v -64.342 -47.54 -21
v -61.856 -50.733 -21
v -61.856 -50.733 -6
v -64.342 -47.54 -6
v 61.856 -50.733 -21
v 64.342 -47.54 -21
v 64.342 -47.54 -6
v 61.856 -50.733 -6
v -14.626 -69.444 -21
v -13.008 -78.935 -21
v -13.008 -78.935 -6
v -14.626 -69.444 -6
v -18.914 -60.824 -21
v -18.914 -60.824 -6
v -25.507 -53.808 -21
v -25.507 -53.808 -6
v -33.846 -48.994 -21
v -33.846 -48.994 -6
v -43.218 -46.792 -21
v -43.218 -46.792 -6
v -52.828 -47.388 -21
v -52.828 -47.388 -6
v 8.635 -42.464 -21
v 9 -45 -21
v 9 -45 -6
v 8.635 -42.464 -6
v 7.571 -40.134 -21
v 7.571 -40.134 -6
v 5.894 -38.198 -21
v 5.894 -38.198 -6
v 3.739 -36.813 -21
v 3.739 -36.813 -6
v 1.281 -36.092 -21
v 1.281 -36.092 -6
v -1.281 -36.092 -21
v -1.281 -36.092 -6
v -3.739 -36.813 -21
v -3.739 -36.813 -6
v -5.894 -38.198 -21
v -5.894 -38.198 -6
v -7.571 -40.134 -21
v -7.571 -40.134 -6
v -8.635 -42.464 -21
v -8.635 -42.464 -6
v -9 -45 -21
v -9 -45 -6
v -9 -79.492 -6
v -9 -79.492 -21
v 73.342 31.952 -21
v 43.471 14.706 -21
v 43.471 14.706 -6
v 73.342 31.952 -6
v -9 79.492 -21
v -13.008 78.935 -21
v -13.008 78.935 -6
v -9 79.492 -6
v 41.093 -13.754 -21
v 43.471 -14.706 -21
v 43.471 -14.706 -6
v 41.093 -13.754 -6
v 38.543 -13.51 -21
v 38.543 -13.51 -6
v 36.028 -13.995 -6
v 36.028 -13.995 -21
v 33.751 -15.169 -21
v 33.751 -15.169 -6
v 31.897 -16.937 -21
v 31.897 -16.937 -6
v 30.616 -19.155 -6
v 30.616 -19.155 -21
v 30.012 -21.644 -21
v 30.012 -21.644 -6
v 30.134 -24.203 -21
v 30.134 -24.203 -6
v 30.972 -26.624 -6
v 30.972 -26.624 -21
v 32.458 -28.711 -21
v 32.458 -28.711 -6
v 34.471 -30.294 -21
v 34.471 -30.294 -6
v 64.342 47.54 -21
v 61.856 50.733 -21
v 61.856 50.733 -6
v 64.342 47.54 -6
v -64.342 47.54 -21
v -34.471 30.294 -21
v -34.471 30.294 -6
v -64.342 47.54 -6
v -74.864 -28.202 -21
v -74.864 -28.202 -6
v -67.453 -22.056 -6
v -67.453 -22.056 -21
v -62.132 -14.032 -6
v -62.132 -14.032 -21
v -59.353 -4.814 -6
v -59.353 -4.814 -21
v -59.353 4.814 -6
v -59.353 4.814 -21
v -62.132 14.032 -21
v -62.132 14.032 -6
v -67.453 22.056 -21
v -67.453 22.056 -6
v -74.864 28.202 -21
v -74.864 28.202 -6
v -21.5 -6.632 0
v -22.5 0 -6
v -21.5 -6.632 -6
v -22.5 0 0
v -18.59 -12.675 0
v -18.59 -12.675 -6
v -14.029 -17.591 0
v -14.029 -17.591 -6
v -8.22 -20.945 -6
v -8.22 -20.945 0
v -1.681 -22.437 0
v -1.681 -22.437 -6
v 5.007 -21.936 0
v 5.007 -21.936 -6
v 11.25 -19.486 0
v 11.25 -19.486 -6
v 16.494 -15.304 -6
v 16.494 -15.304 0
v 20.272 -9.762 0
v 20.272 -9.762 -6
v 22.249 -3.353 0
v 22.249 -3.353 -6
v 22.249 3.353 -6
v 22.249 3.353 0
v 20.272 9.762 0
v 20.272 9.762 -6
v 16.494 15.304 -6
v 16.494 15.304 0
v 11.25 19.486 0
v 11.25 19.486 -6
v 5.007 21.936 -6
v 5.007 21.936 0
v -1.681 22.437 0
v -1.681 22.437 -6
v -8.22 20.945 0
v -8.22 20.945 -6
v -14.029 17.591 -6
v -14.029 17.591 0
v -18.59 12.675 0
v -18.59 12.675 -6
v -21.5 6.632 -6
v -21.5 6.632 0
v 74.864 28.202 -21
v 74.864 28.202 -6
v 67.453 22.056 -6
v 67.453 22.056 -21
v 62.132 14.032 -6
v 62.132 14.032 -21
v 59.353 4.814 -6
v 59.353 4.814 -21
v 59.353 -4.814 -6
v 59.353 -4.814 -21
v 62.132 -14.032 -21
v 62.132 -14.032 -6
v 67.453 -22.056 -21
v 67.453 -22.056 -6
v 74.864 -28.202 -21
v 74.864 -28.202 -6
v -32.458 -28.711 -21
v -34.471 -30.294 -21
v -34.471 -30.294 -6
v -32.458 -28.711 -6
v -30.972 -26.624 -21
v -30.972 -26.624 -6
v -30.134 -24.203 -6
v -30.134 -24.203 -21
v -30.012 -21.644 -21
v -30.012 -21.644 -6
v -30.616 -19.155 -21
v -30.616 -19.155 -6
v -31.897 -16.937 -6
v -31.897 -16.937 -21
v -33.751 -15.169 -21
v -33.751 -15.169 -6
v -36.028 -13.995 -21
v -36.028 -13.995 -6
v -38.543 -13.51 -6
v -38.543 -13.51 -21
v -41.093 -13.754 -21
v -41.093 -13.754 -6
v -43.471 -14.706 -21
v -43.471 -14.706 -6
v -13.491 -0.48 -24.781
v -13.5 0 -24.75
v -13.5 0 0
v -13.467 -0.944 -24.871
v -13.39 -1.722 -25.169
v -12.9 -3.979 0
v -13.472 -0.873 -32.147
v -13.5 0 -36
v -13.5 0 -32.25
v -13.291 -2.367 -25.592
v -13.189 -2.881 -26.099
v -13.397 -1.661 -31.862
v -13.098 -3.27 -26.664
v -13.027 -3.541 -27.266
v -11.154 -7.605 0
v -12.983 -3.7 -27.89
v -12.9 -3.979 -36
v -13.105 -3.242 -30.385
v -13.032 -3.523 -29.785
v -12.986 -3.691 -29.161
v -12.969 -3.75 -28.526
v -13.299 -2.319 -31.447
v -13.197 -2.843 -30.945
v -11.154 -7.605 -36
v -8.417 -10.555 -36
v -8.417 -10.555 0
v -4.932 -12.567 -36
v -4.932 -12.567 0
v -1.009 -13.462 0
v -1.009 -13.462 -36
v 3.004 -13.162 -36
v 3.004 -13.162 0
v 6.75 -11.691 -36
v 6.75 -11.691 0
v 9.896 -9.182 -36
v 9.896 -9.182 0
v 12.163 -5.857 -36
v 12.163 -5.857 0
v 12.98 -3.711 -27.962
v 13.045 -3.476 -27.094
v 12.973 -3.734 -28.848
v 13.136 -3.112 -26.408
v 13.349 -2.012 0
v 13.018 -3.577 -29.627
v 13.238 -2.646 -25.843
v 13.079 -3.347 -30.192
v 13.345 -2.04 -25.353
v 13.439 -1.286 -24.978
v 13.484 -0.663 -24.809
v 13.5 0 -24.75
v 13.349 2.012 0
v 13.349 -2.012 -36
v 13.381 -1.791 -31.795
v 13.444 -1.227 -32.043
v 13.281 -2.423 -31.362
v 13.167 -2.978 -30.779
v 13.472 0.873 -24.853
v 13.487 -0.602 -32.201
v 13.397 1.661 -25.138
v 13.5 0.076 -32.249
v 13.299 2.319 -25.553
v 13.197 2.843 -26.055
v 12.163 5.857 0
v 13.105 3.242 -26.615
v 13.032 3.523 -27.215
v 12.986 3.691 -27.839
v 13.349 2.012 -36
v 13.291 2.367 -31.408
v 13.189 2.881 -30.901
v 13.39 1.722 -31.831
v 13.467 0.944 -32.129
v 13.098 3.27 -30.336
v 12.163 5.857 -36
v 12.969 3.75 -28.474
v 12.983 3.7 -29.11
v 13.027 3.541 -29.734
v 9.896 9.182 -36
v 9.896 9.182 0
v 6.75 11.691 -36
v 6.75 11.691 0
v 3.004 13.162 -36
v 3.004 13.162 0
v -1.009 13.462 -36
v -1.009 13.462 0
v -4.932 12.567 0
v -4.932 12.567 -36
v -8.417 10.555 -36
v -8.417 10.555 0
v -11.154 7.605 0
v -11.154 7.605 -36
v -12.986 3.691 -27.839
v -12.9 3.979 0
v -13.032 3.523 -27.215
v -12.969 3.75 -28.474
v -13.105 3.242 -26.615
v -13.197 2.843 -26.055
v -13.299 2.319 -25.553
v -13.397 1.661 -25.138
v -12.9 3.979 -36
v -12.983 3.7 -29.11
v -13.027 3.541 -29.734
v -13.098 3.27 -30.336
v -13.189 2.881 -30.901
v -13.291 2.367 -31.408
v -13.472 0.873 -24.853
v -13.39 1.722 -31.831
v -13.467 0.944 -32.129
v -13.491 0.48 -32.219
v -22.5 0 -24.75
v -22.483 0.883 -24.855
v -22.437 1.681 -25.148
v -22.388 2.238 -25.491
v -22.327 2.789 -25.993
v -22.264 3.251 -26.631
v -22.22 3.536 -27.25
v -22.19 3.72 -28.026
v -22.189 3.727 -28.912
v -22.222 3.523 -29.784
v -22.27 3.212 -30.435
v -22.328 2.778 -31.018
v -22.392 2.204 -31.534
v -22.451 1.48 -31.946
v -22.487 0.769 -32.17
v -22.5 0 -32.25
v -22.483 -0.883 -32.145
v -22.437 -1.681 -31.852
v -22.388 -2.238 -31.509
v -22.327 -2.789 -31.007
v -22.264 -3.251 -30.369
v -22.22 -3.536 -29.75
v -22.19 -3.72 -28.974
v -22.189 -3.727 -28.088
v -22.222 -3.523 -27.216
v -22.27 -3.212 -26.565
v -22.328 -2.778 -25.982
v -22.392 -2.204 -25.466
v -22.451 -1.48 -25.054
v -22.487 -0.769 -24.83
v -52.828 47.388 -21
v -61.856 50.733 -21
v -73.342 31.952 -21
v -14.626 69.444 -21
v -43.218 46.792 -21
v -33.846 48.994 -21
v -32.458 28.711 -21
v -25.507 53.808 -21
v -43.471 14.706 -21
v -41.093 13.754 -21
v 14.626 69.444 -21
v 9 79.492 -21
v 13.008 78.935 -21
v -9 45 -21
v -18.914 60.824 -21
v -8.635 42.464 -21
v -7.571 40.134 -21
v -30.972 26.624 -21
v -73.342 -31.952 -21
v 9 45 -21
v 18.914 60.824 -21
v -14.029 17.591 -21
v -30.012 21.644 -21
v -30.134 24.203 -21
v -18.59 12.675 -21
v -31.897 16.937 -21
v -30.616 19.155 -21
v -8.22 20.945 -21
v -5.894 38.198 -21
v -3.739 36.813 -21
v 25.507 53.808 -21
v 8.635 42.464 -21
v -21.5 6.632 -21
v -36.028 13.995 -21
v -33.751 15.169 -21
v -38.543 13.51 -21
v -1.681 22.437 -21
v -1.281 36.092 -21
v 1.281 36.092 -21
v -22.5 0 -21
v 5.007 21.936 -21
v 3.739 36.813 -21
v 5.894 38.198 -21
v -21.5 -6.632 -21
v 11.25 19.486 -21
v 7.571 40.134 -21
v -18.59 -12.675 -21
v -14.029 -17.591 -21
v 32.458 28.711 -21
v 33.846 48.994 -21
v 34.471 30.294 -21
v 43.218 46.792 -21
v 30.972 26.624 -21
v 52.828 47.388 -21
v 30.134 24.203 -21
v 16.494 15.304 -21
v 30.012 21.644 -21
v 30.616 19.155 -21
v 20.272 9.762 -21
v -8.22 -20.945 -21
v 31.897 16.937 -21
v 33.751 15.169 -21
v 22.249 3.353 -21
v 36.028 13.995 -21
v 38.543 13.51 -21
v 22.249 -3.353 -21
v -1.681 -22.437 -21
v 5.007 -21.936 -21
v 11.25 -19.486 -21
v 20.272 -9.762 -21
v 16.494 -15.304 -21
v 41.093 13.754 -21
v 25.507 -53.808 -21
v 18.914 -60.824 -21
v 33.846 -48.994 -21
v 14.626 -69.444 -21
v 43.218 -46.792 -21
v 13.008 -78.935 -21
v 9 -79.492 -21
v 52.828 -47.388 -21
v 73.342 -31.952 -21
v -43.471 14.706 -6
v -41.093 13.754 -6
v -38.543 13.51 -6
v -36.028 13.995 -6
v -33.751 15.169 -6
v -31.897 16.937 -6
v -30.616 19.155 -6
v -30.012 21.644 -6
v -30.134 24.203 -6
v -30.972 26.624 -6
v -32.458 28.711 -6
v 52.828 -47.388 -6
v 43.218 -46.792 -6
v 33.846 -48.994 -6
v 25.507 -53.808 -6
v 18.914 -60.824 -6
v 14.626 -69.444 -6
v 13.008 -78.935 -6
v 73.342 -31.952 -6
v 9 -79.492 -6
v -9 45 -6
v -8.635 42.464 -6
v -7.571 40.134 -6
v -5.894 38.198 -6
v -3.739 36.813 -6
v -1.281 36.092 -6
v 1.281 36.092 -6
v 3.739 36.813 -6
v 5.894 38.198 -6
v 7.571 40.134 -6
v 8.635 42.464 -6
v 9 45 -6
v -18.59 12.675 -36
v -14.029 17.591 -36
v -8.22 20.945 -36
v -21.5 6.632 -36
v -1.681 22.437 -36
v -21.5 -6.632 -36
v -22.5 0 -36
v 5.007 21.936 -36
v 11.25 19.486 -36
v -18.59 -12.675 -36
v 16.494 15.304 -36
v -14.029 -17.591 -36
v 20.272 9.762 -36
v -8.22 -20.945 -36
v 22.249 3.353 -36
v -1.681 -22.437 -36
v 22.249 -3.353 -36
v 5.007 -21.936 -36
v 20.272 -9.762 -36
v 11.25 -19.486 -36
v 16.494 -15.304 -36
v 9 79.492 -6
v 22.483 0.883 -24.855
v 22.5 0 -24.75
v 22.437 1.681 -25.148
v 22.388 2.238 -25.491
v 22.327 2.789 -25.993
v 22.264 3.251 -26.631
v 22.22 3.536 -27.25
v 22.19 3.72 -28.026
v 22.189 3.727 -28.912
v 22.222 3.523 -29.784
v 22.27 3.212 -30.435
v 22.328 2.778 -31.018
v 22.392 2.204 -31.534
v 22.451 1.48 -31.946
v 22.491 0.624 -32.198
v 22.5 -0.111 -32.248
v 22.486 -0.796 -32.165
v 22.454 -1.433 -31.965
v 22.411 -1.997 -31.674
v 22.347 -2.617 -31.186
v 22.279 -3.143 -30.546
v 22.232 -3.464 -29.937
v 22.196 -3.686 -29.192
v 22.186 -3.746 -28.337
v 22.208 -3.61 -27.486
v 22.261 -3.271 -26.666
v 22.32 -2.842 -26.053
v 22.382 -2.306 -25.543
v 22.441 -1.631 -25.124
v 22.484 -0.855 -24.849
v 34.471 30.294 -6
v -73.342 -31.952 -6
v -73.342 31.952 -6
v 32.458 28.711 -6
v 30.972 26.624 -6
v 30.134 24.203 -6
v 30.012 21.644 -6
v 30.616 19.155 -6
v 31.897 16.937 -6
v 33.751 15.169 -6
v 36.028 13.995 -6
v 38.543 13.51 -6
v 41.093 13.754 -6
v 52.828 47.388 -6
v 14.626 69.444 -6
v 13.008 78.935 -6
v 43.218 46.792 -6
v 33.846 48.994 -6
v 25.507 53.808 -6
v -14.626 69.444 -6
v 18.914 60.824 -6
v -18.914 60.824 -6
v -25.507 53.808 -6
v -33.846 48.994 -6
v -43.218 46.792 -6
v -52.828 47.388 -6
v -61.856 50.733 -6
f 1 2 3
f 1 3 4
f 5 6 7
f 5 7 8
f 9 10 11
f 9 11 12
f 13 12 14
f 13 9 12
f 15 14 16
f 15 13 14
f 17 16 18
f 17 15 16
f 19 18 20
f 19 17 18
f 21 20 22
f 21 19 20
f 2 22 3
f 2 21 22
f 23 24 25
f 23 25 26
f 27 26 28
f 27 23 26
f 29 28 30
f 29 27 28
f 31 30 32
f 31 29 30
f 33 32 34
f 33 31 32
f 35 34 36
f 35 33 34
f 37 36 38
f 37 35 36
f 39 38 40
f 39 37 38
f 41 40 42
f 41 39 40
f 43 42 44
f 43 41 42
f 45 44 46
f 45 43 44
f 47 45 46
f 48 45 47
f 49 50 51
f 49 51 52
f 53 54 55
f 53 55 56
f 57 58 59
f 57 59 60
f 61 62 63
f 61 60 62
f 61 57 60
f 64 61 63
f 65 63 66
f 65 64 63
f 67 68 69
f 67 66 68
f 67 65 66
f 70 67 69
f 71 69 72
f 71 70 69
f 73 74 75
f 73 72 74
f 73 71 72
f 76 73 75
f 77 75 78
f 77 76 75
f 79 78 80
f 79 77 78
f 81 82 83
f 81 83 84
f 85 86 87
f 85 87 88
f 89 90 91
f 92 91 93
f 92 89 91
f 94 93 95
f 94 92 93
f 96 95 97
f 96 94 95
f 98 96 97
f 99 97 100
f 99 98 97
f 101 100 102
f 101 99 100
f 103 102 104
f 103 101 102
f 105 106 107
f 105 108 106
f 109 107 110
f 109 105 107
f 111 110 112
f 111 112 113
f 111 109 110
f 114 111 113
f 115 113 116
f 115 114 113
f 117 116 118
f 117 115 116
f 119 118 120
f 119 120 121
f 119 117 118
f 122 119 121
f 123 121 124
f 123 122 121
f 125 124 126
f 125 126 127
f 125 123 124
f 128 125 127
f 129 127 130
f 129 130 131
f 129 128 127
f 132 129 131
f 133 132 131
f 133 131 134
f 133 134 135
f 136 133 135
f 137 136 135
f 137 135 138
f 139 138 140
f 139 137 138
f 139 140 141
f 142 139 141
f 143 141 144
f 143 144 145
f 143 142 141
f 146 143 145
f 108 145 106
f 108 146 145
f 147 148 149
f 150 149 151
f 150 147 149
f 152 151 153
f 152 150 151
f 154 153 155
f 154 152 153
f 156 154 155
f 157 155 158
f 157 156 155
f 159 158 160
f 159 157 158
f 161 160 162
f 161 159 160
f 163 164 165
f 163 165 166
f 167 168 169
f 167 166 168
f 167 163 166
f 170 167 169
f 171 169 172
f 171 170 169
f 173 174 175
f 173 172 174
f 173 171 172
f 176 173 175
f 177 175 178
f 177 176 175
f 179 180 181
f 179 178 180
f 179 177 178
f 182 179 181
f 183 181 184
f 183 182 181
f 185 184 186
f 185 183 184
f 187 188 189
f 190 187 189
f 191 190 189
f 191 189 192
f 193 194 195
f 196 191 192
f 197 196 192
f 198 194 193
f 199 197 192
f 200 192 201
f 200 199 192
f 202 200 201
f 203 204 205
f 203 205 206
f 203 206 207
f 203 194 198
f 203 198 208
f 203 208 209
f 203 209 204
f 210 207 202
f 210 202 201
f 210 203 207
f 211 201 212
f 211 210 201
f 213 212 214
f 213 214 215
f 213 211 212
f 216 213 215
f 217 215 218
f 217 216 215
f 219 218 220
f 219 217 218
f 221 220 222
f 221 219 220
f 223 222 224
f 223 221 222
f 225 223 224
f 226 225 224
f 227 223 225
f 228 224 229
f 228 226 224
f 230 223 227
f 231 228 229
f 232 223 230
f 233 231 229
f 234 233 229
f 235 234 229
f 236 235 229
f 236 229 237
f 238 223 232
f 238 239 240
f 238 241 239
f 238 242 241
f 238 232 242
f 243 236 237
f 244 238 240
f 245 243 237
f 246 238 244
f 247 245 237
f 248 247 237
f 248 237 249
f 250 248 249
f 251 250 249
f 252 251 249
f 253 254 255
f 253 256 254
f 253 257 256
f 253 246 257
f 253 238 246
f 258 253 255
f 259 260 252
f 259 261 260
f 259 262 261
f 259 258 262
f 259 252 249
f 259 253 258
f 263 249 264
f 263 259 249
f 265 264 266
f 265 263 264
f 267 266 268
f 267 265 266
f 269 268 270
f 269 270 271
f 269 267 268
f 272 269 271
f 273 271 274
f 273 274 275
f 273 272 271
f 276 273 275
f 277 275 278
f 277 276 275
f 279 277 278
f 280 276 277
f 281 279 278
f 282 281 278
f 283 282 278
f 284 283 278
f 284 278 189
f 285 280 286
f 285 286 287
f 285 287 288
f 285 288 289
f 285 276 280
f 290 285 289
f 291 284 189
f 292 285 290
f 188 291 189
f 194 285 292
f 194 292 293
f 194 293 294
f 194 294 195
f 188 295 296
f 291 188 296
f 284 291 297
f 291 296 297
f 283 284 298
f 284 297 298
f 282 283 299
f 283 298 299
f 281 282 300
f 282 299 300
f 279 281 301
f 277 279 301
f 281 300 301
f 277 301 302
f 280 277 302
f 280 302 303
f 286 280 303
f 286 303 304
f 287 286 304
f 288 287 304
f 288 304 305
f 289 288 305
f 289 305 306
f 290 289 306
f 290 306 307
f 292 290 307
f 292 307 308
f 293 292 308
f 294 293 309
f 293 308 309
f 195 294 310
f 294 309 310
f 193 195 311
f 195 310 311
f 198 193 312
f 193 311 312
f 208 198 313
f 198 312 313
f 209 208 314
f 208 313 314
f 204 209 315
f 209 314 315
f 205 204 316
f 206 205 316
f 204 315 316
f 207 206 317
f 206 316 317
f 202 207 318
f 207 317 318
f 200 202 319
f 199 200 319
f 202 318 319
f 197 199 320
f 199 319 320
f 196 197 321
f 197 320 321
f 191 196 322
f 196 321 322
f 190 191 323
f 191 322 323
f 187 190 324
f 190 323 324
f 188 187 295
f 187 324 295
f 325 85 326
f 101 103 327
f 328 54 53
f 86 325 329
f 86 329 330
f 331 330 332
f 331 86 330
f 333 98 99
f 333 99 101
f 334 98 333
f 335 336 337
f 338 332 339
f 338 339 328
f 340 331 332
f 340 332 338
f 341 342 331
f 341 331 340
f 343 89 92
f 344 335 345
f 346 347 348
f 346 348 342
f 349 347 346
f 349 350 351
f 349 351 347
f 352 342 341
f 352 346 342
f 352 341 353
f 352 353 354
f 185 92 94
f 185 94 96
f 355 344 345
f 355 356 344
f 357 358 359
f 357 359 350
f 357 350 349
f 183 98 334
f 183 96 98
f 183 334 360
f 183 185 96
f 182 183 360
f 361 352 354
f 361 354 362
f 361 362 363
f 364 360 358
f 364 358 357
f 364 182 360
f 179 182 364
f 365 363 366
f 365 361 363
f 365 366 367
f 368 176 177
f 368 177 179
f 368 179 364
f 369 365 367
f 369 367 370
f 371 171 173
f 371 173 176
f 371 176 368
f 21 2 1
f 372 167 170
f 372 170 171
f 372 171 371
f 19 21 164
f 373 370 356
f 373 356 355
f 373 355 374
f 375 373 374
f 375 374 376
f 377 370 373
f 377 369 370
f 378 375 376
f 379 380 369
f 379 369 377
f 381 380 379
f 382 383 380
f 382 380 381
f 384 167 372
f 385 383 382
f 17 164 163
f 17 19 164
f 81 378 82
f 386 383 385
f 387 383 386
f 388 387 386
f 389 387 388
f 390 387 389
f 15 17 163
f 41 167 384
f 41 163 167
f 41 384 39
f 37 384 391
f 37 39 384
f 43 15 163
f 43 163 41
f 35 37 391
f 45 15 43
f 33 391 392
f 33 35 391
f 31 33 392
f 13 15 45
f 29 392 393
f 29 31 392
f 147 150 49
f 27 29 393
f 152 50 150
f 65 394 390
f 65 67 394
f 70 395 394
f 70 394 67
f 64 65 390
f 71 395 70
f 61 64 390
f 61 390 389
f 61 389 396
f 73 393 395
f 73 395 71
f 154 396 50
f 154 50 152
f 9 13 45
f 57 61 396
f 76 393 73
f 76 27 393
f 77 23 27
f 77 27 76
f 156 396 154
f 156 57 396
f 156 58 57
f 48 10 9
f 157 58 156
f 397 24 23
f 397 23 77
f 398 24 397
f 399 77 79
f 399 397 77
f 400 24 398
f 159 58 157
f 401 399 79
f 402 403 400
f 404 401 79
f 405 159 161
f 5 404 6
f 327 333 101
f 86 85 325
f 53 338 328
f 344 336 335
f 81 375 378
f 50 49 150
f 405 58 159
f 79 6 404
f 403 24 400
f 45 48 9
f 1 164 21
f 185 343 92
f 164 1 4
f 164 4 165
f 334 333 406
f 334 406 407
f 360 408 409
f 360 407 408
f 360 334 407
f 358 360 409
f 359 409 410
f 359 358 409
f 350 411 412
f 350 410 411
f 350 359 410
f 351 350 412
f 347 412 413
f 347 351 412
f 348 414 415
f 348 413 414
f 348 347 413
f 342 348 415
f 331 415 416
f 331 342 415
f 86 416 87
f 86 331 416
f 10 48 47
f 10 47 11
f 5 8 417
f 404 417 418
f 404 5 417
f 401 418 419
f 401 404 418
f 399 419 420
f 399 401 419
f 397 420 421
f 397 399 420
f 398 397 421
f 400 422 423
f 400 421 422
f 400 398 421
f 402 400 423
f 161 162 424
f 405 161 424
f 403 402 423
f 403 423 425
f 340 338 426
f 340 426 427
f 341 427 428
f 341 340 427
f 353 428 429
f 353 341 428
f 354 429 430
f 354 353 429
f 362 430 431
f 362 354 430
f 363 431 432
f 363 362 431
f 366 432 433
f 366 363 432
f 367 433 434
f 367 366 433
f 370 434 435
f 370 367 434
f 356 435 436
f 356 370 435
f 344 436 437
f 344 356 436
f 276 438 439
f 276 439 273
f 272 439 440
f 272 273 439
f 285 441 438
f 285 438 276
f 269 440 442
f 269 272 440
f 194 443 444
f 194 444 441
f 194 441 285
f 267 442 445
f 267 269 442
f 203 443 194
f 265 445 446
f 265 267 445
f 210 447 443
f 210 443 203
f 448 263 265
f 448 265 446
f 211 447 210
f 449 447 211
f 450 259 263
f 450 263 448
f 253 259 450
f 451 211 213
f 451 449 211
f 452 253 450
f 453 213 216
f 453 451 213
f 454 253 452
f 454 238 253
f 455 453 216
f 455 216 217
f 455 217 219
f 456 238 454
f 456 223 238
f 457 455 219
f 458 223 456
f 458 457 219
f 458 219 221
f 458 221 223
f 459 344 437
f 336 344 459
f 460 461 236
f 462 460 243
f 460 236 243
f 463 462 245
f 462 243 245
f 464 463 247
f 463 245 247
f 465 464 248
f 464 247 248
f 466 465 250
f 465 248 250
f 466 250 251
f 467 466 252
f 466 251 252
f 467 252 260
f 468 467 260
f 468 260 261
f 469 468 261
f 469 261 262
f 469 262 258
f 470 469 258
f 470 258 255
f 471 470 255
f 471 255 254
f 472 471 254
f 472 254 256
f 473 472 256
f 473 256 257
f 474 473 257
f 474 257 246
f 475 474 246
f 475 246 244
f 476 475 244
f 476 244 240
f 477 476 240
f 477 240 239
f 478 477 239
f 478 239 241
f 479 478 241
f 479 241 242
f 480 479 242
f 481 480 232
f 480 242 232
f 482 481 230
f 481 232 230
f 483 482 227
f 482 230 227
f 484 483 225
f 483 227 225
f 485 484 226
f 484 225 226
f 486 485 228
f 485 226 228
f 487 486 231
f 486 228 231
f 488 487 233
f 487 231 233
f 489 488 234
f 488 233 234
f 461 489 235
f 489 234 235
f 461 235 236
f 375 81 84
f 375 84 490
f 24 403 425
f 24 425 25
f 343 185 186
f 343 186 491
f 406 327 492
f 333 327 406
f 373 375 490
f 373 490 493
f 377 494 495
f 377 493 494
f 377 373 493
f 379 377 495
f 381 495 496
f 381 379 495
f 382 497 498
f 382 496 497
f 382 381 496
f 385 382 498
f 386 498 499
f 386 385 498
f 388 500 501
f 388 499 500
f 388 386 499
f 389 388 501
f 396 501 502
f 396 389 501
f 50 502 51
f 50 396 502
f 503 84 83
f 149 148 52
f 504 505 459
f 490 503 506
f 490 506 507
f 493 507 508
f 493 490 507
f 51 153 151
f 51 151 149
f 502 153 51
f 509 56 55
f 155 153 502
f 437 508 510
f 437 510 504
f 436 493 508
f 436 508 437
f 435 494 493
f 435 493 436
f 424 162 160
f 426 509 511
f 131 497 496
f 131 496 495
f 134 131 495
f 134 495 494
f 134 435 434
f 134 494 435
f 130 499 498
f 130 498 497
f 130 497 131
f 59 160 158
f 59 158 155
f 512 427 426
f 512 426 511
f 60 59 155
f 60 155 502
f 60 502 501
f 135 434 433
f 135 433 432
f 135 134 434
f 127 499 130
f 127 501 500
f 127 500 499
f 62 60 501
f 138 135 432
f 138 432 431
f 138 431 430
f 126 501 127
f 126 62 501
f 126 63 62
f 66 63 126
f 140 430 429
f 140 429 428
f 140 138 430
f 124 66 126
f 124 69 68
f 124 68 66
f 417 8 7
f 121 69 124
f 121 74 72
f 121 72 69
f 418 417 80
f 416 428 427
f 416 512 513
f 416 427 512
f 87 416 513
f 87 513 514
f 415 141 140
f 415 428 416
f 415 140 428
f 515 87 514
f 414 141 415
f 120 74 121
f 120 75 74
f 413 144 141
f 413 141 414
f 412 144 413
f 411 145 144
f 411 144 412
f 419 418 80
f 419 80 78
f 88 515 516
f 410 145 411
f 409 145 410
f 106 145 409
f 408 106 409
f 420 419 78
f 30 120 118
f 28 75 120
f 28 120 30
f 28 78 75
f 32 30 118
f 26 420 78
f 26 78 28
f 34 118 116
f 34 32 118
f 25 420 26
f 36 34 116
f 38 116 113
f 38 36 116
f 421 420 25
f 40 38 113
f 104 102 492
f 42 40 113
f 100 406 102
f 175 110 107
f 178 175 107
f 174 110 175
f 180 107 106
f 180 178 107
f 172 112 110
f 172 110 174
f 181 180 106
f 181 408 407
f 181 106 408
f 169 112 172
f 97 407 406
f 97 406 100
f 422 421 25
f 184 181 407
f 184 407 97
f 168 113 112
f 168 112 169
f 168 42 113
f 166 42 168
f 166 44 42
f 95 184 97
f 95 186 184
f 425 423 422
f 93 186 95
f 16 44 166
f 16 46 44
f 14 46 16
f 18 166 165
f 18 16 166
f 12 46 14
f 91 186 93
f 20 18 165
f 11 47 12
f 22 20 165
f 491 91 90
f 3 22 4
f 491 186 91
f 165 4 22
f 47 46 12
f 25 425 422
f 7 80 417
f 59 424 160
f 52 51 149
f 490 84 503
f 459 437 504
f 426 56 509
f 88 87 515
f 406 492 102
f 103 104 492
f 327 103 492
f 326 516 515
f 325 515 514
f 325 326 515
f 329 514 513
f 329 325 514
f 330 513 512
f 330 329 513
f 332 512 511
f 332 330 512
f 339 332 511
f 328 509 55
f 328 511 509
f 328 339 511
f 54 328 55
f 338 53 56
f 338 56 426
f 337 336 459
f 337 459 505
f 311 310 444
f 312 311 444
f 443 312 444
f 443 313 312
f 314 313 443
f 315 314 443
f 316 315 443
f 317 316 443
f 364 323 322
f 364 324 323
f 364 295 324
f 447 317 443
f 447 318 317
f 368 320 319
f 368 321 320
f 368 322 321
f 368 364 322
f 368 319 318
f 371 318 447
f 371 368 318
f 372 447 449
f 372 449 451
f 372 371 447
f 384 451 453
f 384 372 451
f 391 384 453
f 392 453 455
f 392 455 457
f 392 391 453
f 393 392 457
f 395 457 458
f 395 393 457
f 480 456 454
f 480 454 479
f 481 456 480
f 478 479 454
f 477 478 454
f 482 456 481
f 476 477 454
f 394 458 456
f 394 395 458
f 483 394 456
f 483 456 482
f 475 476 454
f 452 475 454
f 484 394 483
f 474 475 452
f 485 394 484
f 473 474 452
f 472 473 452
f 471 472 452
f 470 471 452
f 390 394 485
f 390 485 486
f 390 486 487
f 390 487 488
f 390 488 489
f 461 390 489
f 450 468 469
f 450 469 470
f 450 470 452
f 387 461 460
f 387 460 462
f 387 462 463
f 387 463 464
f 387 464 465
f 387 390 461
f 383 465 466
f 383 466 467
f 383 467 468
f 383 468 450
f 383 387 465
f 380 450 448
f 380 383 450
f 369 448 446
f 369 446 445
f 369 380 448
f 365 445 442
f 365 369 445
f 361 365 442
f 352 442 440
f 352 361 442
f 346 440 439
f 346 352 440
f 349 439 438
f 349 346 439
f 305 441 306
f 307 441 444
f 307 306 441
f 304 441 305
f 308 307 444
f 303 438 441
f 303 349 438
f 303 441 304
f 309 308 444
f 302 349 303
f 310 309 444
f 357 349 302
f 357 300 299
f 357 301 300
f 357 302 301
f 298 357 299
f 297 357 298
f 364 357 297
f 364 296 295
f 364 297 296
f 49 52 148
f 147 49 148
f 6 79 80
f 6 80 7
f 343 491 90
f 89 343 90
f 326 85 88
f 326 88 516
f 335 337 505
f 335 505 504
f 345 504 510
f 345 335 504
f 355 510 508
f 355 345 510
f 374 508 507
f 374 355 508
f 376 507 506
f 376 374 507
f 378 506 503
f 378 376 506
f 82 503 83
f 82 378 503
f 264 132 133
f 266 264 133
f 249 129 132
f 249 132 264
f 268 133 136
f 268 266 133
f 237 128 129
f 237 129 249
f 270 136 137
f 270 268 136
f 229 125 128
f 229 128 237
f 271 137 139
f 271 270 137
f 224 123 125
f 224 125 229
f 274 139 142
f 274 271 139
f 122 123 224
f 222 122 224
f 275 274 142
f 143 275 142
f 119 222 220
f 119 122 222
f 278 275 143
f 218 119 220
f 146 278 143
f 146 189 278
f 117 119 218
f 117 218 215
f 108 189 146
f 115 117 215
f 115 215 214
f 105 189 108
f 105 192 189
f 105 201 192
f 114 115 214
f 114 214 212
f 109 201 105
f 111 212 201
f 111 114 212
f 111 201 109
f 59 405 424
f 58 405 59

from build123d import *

# Parameters (mm, degrees)
FORO_7_5_7_5_1_D         = 7.5
SCHIZZO9_OUTSIDE_W       = 207.824
SCHIZZO9_OUTSIDE_H       = 207.824
TAGLIO_ESTRUSIONE1_DEPTH = 116.069544208


with BuildPart() as part:
    # Schizzo6 → Rivoluzione1 (revolve)
    with BuildSketch(Plane(origin=(0, 0, 0), x_dir=(1, 0, 0), z_dir=(0, 1, 0)), mode=Mode.PRIVATE) as rivoluzione1_sk:
        Polygon((13.5, 0), (13.5, 36), (22.5, 36), (22.5, 21), (80, 21), (80, 6), (22.5, 6), (22.5, 0), align=None)
    revolve(rivoluzione1_sk.sketch.rotate(Axis((0, 0, -47.894415312), (0, 0, 1)), 180), axis=Axis((0, 0, -47.894415312), (0, 0, 1)))

    # Foro Ø7.5 (7.5)-1 (through all)
    with Locations(Plane(origin=(22.5, 0, 0), x_dir=(0, 0, -1), z_dir=(1, 0, 0))):
        with Locations((28.5, 0)):
            Hole(FORO_7_5_7_5_1_D / 2)

    # Schizzo9 outside → Taglio-Estrusione1 (cut, through all)
    with BuildSketch(Plane(origin=(0, 0, -21), x_dir=(-1, 0, 0), z_dir=(0, 0, -1))):
        Rectangle(SCHIZZO9_OUTSIDE_W, SCHIZZO9_OUTSIDE_H)
        with BuildLine():
            Line((9, 79.492137976), (9, 45))
            ThreePointArc((9, 45), (0, 36), (-9, 45))
            Line((-9, 45), (-9, 79.492137976))
            Line((-9, 79.492137976), (-13.008275981, 78.935320079))
            ThreePointArc((-13.008275981, 78.935320079), (-29.5, 51.095498823), (-61.855854454, 50.733157498))
            Line((-61.855854454, 50.733157498), (-64.342210888, 47.540297622))
            Line((-64.342210888, 47.540297622), (-34.47114317, 30.294228634))
            ThreePointArc((-34.47114317, 30.294228634), (-31.176914536, 18), (-43.47114317, 14.705771366))
            Line((-43.47114317, 14.705771366), (-73.342210888, 31.951840354))
            Line((-73.342210888, 31.951840354), (-74.864130435, 28.202162581))
            ThreePointArc((-74.864130435, 28.202162581), (-59, 0), (-74.864130435, -28.202162581))
            Line((-74.864130435, -28.202162581), (-73.342210888, -31.951840354))
            Line((-73.342210888, -31.951840354), (-43.47114317, -14.705771366))
            ThreePointArc((-43.47114317, -14.705771366), (-31.176914536, -18), (-34.47114317, -30.294228634))
            Line((-34.47114317, -30.294228634), (-64.342210888, -47.540297622))
            Line((-64.342210888, -47.540297622), (-61.855854454, -50.733157498))
            ThreePointArc((-61.855854454, -50.733157498), (-29.5, -51.095498823), (-13.008275981, -78.935320079))
            Line((-13.008275981, -78.935320079), (-9, -79.492137976))
            Line((-9, -79.492137976), (-9, -45))
            ThreePointArc((-9, -45), (0, -36), (9, -45))
            Line((9, -45), (9, -79.492137976))
            Line((9, -79.492137976), (13.008275981, -78.935320079))
            ThreePointArc((13.008275981, -78.935320079), (29.5, -51.095498823), (61.855854454, -50.733157498))
            Line((61.855854454, -50.733157498), (64.342210888, -47.540297622))
            Line((64.342210888, -47.540297622), (34.47114317, -30.294228634))
            ThreePointArc((34.47114317, -30.294228634), (31.176914536, -18), (43.47114317, -14.705771366))
            Line((43.47114317, -14.705771366), (73.342210888, -31.951840354))
            Line((73.342210888, -31.951840354), (74.864130435, -28.202162581))
            ThreePointArc((74.864130435, -28.202162581), (59, 0), (74.864130435, 28.202162581))
            Line((74.864130435, 28.202162581), (73.342210888, 31.951840354))
            Line((73.342210888, 31.951840354), (43.47114317, 14.705771366))
            ThreePointArc((43.47114317, 14.705771366), (31.176914536, 18), (34.47114317, 30.294228634))
            Line((34.47114317, 30.294228634), (64.342210888, 47.540297622))
            Line((64.342210888, 47.540297622), (61.855854454, 50.733157498))
            ThreePointArc((61.855854454, 50.733157498), (29.5, 51.095498823), (13.008275981, 78.935320079))
            Line((13.008275981, 78.935320079), (9, 79.492137976))
        make_face(mode=Mode.SUBTRACT)
    extrude(amount=-TAGLIO_ESTRUSIONE1_DEPTH, mode=Mode.SUBTRACT)


solid = part.part
